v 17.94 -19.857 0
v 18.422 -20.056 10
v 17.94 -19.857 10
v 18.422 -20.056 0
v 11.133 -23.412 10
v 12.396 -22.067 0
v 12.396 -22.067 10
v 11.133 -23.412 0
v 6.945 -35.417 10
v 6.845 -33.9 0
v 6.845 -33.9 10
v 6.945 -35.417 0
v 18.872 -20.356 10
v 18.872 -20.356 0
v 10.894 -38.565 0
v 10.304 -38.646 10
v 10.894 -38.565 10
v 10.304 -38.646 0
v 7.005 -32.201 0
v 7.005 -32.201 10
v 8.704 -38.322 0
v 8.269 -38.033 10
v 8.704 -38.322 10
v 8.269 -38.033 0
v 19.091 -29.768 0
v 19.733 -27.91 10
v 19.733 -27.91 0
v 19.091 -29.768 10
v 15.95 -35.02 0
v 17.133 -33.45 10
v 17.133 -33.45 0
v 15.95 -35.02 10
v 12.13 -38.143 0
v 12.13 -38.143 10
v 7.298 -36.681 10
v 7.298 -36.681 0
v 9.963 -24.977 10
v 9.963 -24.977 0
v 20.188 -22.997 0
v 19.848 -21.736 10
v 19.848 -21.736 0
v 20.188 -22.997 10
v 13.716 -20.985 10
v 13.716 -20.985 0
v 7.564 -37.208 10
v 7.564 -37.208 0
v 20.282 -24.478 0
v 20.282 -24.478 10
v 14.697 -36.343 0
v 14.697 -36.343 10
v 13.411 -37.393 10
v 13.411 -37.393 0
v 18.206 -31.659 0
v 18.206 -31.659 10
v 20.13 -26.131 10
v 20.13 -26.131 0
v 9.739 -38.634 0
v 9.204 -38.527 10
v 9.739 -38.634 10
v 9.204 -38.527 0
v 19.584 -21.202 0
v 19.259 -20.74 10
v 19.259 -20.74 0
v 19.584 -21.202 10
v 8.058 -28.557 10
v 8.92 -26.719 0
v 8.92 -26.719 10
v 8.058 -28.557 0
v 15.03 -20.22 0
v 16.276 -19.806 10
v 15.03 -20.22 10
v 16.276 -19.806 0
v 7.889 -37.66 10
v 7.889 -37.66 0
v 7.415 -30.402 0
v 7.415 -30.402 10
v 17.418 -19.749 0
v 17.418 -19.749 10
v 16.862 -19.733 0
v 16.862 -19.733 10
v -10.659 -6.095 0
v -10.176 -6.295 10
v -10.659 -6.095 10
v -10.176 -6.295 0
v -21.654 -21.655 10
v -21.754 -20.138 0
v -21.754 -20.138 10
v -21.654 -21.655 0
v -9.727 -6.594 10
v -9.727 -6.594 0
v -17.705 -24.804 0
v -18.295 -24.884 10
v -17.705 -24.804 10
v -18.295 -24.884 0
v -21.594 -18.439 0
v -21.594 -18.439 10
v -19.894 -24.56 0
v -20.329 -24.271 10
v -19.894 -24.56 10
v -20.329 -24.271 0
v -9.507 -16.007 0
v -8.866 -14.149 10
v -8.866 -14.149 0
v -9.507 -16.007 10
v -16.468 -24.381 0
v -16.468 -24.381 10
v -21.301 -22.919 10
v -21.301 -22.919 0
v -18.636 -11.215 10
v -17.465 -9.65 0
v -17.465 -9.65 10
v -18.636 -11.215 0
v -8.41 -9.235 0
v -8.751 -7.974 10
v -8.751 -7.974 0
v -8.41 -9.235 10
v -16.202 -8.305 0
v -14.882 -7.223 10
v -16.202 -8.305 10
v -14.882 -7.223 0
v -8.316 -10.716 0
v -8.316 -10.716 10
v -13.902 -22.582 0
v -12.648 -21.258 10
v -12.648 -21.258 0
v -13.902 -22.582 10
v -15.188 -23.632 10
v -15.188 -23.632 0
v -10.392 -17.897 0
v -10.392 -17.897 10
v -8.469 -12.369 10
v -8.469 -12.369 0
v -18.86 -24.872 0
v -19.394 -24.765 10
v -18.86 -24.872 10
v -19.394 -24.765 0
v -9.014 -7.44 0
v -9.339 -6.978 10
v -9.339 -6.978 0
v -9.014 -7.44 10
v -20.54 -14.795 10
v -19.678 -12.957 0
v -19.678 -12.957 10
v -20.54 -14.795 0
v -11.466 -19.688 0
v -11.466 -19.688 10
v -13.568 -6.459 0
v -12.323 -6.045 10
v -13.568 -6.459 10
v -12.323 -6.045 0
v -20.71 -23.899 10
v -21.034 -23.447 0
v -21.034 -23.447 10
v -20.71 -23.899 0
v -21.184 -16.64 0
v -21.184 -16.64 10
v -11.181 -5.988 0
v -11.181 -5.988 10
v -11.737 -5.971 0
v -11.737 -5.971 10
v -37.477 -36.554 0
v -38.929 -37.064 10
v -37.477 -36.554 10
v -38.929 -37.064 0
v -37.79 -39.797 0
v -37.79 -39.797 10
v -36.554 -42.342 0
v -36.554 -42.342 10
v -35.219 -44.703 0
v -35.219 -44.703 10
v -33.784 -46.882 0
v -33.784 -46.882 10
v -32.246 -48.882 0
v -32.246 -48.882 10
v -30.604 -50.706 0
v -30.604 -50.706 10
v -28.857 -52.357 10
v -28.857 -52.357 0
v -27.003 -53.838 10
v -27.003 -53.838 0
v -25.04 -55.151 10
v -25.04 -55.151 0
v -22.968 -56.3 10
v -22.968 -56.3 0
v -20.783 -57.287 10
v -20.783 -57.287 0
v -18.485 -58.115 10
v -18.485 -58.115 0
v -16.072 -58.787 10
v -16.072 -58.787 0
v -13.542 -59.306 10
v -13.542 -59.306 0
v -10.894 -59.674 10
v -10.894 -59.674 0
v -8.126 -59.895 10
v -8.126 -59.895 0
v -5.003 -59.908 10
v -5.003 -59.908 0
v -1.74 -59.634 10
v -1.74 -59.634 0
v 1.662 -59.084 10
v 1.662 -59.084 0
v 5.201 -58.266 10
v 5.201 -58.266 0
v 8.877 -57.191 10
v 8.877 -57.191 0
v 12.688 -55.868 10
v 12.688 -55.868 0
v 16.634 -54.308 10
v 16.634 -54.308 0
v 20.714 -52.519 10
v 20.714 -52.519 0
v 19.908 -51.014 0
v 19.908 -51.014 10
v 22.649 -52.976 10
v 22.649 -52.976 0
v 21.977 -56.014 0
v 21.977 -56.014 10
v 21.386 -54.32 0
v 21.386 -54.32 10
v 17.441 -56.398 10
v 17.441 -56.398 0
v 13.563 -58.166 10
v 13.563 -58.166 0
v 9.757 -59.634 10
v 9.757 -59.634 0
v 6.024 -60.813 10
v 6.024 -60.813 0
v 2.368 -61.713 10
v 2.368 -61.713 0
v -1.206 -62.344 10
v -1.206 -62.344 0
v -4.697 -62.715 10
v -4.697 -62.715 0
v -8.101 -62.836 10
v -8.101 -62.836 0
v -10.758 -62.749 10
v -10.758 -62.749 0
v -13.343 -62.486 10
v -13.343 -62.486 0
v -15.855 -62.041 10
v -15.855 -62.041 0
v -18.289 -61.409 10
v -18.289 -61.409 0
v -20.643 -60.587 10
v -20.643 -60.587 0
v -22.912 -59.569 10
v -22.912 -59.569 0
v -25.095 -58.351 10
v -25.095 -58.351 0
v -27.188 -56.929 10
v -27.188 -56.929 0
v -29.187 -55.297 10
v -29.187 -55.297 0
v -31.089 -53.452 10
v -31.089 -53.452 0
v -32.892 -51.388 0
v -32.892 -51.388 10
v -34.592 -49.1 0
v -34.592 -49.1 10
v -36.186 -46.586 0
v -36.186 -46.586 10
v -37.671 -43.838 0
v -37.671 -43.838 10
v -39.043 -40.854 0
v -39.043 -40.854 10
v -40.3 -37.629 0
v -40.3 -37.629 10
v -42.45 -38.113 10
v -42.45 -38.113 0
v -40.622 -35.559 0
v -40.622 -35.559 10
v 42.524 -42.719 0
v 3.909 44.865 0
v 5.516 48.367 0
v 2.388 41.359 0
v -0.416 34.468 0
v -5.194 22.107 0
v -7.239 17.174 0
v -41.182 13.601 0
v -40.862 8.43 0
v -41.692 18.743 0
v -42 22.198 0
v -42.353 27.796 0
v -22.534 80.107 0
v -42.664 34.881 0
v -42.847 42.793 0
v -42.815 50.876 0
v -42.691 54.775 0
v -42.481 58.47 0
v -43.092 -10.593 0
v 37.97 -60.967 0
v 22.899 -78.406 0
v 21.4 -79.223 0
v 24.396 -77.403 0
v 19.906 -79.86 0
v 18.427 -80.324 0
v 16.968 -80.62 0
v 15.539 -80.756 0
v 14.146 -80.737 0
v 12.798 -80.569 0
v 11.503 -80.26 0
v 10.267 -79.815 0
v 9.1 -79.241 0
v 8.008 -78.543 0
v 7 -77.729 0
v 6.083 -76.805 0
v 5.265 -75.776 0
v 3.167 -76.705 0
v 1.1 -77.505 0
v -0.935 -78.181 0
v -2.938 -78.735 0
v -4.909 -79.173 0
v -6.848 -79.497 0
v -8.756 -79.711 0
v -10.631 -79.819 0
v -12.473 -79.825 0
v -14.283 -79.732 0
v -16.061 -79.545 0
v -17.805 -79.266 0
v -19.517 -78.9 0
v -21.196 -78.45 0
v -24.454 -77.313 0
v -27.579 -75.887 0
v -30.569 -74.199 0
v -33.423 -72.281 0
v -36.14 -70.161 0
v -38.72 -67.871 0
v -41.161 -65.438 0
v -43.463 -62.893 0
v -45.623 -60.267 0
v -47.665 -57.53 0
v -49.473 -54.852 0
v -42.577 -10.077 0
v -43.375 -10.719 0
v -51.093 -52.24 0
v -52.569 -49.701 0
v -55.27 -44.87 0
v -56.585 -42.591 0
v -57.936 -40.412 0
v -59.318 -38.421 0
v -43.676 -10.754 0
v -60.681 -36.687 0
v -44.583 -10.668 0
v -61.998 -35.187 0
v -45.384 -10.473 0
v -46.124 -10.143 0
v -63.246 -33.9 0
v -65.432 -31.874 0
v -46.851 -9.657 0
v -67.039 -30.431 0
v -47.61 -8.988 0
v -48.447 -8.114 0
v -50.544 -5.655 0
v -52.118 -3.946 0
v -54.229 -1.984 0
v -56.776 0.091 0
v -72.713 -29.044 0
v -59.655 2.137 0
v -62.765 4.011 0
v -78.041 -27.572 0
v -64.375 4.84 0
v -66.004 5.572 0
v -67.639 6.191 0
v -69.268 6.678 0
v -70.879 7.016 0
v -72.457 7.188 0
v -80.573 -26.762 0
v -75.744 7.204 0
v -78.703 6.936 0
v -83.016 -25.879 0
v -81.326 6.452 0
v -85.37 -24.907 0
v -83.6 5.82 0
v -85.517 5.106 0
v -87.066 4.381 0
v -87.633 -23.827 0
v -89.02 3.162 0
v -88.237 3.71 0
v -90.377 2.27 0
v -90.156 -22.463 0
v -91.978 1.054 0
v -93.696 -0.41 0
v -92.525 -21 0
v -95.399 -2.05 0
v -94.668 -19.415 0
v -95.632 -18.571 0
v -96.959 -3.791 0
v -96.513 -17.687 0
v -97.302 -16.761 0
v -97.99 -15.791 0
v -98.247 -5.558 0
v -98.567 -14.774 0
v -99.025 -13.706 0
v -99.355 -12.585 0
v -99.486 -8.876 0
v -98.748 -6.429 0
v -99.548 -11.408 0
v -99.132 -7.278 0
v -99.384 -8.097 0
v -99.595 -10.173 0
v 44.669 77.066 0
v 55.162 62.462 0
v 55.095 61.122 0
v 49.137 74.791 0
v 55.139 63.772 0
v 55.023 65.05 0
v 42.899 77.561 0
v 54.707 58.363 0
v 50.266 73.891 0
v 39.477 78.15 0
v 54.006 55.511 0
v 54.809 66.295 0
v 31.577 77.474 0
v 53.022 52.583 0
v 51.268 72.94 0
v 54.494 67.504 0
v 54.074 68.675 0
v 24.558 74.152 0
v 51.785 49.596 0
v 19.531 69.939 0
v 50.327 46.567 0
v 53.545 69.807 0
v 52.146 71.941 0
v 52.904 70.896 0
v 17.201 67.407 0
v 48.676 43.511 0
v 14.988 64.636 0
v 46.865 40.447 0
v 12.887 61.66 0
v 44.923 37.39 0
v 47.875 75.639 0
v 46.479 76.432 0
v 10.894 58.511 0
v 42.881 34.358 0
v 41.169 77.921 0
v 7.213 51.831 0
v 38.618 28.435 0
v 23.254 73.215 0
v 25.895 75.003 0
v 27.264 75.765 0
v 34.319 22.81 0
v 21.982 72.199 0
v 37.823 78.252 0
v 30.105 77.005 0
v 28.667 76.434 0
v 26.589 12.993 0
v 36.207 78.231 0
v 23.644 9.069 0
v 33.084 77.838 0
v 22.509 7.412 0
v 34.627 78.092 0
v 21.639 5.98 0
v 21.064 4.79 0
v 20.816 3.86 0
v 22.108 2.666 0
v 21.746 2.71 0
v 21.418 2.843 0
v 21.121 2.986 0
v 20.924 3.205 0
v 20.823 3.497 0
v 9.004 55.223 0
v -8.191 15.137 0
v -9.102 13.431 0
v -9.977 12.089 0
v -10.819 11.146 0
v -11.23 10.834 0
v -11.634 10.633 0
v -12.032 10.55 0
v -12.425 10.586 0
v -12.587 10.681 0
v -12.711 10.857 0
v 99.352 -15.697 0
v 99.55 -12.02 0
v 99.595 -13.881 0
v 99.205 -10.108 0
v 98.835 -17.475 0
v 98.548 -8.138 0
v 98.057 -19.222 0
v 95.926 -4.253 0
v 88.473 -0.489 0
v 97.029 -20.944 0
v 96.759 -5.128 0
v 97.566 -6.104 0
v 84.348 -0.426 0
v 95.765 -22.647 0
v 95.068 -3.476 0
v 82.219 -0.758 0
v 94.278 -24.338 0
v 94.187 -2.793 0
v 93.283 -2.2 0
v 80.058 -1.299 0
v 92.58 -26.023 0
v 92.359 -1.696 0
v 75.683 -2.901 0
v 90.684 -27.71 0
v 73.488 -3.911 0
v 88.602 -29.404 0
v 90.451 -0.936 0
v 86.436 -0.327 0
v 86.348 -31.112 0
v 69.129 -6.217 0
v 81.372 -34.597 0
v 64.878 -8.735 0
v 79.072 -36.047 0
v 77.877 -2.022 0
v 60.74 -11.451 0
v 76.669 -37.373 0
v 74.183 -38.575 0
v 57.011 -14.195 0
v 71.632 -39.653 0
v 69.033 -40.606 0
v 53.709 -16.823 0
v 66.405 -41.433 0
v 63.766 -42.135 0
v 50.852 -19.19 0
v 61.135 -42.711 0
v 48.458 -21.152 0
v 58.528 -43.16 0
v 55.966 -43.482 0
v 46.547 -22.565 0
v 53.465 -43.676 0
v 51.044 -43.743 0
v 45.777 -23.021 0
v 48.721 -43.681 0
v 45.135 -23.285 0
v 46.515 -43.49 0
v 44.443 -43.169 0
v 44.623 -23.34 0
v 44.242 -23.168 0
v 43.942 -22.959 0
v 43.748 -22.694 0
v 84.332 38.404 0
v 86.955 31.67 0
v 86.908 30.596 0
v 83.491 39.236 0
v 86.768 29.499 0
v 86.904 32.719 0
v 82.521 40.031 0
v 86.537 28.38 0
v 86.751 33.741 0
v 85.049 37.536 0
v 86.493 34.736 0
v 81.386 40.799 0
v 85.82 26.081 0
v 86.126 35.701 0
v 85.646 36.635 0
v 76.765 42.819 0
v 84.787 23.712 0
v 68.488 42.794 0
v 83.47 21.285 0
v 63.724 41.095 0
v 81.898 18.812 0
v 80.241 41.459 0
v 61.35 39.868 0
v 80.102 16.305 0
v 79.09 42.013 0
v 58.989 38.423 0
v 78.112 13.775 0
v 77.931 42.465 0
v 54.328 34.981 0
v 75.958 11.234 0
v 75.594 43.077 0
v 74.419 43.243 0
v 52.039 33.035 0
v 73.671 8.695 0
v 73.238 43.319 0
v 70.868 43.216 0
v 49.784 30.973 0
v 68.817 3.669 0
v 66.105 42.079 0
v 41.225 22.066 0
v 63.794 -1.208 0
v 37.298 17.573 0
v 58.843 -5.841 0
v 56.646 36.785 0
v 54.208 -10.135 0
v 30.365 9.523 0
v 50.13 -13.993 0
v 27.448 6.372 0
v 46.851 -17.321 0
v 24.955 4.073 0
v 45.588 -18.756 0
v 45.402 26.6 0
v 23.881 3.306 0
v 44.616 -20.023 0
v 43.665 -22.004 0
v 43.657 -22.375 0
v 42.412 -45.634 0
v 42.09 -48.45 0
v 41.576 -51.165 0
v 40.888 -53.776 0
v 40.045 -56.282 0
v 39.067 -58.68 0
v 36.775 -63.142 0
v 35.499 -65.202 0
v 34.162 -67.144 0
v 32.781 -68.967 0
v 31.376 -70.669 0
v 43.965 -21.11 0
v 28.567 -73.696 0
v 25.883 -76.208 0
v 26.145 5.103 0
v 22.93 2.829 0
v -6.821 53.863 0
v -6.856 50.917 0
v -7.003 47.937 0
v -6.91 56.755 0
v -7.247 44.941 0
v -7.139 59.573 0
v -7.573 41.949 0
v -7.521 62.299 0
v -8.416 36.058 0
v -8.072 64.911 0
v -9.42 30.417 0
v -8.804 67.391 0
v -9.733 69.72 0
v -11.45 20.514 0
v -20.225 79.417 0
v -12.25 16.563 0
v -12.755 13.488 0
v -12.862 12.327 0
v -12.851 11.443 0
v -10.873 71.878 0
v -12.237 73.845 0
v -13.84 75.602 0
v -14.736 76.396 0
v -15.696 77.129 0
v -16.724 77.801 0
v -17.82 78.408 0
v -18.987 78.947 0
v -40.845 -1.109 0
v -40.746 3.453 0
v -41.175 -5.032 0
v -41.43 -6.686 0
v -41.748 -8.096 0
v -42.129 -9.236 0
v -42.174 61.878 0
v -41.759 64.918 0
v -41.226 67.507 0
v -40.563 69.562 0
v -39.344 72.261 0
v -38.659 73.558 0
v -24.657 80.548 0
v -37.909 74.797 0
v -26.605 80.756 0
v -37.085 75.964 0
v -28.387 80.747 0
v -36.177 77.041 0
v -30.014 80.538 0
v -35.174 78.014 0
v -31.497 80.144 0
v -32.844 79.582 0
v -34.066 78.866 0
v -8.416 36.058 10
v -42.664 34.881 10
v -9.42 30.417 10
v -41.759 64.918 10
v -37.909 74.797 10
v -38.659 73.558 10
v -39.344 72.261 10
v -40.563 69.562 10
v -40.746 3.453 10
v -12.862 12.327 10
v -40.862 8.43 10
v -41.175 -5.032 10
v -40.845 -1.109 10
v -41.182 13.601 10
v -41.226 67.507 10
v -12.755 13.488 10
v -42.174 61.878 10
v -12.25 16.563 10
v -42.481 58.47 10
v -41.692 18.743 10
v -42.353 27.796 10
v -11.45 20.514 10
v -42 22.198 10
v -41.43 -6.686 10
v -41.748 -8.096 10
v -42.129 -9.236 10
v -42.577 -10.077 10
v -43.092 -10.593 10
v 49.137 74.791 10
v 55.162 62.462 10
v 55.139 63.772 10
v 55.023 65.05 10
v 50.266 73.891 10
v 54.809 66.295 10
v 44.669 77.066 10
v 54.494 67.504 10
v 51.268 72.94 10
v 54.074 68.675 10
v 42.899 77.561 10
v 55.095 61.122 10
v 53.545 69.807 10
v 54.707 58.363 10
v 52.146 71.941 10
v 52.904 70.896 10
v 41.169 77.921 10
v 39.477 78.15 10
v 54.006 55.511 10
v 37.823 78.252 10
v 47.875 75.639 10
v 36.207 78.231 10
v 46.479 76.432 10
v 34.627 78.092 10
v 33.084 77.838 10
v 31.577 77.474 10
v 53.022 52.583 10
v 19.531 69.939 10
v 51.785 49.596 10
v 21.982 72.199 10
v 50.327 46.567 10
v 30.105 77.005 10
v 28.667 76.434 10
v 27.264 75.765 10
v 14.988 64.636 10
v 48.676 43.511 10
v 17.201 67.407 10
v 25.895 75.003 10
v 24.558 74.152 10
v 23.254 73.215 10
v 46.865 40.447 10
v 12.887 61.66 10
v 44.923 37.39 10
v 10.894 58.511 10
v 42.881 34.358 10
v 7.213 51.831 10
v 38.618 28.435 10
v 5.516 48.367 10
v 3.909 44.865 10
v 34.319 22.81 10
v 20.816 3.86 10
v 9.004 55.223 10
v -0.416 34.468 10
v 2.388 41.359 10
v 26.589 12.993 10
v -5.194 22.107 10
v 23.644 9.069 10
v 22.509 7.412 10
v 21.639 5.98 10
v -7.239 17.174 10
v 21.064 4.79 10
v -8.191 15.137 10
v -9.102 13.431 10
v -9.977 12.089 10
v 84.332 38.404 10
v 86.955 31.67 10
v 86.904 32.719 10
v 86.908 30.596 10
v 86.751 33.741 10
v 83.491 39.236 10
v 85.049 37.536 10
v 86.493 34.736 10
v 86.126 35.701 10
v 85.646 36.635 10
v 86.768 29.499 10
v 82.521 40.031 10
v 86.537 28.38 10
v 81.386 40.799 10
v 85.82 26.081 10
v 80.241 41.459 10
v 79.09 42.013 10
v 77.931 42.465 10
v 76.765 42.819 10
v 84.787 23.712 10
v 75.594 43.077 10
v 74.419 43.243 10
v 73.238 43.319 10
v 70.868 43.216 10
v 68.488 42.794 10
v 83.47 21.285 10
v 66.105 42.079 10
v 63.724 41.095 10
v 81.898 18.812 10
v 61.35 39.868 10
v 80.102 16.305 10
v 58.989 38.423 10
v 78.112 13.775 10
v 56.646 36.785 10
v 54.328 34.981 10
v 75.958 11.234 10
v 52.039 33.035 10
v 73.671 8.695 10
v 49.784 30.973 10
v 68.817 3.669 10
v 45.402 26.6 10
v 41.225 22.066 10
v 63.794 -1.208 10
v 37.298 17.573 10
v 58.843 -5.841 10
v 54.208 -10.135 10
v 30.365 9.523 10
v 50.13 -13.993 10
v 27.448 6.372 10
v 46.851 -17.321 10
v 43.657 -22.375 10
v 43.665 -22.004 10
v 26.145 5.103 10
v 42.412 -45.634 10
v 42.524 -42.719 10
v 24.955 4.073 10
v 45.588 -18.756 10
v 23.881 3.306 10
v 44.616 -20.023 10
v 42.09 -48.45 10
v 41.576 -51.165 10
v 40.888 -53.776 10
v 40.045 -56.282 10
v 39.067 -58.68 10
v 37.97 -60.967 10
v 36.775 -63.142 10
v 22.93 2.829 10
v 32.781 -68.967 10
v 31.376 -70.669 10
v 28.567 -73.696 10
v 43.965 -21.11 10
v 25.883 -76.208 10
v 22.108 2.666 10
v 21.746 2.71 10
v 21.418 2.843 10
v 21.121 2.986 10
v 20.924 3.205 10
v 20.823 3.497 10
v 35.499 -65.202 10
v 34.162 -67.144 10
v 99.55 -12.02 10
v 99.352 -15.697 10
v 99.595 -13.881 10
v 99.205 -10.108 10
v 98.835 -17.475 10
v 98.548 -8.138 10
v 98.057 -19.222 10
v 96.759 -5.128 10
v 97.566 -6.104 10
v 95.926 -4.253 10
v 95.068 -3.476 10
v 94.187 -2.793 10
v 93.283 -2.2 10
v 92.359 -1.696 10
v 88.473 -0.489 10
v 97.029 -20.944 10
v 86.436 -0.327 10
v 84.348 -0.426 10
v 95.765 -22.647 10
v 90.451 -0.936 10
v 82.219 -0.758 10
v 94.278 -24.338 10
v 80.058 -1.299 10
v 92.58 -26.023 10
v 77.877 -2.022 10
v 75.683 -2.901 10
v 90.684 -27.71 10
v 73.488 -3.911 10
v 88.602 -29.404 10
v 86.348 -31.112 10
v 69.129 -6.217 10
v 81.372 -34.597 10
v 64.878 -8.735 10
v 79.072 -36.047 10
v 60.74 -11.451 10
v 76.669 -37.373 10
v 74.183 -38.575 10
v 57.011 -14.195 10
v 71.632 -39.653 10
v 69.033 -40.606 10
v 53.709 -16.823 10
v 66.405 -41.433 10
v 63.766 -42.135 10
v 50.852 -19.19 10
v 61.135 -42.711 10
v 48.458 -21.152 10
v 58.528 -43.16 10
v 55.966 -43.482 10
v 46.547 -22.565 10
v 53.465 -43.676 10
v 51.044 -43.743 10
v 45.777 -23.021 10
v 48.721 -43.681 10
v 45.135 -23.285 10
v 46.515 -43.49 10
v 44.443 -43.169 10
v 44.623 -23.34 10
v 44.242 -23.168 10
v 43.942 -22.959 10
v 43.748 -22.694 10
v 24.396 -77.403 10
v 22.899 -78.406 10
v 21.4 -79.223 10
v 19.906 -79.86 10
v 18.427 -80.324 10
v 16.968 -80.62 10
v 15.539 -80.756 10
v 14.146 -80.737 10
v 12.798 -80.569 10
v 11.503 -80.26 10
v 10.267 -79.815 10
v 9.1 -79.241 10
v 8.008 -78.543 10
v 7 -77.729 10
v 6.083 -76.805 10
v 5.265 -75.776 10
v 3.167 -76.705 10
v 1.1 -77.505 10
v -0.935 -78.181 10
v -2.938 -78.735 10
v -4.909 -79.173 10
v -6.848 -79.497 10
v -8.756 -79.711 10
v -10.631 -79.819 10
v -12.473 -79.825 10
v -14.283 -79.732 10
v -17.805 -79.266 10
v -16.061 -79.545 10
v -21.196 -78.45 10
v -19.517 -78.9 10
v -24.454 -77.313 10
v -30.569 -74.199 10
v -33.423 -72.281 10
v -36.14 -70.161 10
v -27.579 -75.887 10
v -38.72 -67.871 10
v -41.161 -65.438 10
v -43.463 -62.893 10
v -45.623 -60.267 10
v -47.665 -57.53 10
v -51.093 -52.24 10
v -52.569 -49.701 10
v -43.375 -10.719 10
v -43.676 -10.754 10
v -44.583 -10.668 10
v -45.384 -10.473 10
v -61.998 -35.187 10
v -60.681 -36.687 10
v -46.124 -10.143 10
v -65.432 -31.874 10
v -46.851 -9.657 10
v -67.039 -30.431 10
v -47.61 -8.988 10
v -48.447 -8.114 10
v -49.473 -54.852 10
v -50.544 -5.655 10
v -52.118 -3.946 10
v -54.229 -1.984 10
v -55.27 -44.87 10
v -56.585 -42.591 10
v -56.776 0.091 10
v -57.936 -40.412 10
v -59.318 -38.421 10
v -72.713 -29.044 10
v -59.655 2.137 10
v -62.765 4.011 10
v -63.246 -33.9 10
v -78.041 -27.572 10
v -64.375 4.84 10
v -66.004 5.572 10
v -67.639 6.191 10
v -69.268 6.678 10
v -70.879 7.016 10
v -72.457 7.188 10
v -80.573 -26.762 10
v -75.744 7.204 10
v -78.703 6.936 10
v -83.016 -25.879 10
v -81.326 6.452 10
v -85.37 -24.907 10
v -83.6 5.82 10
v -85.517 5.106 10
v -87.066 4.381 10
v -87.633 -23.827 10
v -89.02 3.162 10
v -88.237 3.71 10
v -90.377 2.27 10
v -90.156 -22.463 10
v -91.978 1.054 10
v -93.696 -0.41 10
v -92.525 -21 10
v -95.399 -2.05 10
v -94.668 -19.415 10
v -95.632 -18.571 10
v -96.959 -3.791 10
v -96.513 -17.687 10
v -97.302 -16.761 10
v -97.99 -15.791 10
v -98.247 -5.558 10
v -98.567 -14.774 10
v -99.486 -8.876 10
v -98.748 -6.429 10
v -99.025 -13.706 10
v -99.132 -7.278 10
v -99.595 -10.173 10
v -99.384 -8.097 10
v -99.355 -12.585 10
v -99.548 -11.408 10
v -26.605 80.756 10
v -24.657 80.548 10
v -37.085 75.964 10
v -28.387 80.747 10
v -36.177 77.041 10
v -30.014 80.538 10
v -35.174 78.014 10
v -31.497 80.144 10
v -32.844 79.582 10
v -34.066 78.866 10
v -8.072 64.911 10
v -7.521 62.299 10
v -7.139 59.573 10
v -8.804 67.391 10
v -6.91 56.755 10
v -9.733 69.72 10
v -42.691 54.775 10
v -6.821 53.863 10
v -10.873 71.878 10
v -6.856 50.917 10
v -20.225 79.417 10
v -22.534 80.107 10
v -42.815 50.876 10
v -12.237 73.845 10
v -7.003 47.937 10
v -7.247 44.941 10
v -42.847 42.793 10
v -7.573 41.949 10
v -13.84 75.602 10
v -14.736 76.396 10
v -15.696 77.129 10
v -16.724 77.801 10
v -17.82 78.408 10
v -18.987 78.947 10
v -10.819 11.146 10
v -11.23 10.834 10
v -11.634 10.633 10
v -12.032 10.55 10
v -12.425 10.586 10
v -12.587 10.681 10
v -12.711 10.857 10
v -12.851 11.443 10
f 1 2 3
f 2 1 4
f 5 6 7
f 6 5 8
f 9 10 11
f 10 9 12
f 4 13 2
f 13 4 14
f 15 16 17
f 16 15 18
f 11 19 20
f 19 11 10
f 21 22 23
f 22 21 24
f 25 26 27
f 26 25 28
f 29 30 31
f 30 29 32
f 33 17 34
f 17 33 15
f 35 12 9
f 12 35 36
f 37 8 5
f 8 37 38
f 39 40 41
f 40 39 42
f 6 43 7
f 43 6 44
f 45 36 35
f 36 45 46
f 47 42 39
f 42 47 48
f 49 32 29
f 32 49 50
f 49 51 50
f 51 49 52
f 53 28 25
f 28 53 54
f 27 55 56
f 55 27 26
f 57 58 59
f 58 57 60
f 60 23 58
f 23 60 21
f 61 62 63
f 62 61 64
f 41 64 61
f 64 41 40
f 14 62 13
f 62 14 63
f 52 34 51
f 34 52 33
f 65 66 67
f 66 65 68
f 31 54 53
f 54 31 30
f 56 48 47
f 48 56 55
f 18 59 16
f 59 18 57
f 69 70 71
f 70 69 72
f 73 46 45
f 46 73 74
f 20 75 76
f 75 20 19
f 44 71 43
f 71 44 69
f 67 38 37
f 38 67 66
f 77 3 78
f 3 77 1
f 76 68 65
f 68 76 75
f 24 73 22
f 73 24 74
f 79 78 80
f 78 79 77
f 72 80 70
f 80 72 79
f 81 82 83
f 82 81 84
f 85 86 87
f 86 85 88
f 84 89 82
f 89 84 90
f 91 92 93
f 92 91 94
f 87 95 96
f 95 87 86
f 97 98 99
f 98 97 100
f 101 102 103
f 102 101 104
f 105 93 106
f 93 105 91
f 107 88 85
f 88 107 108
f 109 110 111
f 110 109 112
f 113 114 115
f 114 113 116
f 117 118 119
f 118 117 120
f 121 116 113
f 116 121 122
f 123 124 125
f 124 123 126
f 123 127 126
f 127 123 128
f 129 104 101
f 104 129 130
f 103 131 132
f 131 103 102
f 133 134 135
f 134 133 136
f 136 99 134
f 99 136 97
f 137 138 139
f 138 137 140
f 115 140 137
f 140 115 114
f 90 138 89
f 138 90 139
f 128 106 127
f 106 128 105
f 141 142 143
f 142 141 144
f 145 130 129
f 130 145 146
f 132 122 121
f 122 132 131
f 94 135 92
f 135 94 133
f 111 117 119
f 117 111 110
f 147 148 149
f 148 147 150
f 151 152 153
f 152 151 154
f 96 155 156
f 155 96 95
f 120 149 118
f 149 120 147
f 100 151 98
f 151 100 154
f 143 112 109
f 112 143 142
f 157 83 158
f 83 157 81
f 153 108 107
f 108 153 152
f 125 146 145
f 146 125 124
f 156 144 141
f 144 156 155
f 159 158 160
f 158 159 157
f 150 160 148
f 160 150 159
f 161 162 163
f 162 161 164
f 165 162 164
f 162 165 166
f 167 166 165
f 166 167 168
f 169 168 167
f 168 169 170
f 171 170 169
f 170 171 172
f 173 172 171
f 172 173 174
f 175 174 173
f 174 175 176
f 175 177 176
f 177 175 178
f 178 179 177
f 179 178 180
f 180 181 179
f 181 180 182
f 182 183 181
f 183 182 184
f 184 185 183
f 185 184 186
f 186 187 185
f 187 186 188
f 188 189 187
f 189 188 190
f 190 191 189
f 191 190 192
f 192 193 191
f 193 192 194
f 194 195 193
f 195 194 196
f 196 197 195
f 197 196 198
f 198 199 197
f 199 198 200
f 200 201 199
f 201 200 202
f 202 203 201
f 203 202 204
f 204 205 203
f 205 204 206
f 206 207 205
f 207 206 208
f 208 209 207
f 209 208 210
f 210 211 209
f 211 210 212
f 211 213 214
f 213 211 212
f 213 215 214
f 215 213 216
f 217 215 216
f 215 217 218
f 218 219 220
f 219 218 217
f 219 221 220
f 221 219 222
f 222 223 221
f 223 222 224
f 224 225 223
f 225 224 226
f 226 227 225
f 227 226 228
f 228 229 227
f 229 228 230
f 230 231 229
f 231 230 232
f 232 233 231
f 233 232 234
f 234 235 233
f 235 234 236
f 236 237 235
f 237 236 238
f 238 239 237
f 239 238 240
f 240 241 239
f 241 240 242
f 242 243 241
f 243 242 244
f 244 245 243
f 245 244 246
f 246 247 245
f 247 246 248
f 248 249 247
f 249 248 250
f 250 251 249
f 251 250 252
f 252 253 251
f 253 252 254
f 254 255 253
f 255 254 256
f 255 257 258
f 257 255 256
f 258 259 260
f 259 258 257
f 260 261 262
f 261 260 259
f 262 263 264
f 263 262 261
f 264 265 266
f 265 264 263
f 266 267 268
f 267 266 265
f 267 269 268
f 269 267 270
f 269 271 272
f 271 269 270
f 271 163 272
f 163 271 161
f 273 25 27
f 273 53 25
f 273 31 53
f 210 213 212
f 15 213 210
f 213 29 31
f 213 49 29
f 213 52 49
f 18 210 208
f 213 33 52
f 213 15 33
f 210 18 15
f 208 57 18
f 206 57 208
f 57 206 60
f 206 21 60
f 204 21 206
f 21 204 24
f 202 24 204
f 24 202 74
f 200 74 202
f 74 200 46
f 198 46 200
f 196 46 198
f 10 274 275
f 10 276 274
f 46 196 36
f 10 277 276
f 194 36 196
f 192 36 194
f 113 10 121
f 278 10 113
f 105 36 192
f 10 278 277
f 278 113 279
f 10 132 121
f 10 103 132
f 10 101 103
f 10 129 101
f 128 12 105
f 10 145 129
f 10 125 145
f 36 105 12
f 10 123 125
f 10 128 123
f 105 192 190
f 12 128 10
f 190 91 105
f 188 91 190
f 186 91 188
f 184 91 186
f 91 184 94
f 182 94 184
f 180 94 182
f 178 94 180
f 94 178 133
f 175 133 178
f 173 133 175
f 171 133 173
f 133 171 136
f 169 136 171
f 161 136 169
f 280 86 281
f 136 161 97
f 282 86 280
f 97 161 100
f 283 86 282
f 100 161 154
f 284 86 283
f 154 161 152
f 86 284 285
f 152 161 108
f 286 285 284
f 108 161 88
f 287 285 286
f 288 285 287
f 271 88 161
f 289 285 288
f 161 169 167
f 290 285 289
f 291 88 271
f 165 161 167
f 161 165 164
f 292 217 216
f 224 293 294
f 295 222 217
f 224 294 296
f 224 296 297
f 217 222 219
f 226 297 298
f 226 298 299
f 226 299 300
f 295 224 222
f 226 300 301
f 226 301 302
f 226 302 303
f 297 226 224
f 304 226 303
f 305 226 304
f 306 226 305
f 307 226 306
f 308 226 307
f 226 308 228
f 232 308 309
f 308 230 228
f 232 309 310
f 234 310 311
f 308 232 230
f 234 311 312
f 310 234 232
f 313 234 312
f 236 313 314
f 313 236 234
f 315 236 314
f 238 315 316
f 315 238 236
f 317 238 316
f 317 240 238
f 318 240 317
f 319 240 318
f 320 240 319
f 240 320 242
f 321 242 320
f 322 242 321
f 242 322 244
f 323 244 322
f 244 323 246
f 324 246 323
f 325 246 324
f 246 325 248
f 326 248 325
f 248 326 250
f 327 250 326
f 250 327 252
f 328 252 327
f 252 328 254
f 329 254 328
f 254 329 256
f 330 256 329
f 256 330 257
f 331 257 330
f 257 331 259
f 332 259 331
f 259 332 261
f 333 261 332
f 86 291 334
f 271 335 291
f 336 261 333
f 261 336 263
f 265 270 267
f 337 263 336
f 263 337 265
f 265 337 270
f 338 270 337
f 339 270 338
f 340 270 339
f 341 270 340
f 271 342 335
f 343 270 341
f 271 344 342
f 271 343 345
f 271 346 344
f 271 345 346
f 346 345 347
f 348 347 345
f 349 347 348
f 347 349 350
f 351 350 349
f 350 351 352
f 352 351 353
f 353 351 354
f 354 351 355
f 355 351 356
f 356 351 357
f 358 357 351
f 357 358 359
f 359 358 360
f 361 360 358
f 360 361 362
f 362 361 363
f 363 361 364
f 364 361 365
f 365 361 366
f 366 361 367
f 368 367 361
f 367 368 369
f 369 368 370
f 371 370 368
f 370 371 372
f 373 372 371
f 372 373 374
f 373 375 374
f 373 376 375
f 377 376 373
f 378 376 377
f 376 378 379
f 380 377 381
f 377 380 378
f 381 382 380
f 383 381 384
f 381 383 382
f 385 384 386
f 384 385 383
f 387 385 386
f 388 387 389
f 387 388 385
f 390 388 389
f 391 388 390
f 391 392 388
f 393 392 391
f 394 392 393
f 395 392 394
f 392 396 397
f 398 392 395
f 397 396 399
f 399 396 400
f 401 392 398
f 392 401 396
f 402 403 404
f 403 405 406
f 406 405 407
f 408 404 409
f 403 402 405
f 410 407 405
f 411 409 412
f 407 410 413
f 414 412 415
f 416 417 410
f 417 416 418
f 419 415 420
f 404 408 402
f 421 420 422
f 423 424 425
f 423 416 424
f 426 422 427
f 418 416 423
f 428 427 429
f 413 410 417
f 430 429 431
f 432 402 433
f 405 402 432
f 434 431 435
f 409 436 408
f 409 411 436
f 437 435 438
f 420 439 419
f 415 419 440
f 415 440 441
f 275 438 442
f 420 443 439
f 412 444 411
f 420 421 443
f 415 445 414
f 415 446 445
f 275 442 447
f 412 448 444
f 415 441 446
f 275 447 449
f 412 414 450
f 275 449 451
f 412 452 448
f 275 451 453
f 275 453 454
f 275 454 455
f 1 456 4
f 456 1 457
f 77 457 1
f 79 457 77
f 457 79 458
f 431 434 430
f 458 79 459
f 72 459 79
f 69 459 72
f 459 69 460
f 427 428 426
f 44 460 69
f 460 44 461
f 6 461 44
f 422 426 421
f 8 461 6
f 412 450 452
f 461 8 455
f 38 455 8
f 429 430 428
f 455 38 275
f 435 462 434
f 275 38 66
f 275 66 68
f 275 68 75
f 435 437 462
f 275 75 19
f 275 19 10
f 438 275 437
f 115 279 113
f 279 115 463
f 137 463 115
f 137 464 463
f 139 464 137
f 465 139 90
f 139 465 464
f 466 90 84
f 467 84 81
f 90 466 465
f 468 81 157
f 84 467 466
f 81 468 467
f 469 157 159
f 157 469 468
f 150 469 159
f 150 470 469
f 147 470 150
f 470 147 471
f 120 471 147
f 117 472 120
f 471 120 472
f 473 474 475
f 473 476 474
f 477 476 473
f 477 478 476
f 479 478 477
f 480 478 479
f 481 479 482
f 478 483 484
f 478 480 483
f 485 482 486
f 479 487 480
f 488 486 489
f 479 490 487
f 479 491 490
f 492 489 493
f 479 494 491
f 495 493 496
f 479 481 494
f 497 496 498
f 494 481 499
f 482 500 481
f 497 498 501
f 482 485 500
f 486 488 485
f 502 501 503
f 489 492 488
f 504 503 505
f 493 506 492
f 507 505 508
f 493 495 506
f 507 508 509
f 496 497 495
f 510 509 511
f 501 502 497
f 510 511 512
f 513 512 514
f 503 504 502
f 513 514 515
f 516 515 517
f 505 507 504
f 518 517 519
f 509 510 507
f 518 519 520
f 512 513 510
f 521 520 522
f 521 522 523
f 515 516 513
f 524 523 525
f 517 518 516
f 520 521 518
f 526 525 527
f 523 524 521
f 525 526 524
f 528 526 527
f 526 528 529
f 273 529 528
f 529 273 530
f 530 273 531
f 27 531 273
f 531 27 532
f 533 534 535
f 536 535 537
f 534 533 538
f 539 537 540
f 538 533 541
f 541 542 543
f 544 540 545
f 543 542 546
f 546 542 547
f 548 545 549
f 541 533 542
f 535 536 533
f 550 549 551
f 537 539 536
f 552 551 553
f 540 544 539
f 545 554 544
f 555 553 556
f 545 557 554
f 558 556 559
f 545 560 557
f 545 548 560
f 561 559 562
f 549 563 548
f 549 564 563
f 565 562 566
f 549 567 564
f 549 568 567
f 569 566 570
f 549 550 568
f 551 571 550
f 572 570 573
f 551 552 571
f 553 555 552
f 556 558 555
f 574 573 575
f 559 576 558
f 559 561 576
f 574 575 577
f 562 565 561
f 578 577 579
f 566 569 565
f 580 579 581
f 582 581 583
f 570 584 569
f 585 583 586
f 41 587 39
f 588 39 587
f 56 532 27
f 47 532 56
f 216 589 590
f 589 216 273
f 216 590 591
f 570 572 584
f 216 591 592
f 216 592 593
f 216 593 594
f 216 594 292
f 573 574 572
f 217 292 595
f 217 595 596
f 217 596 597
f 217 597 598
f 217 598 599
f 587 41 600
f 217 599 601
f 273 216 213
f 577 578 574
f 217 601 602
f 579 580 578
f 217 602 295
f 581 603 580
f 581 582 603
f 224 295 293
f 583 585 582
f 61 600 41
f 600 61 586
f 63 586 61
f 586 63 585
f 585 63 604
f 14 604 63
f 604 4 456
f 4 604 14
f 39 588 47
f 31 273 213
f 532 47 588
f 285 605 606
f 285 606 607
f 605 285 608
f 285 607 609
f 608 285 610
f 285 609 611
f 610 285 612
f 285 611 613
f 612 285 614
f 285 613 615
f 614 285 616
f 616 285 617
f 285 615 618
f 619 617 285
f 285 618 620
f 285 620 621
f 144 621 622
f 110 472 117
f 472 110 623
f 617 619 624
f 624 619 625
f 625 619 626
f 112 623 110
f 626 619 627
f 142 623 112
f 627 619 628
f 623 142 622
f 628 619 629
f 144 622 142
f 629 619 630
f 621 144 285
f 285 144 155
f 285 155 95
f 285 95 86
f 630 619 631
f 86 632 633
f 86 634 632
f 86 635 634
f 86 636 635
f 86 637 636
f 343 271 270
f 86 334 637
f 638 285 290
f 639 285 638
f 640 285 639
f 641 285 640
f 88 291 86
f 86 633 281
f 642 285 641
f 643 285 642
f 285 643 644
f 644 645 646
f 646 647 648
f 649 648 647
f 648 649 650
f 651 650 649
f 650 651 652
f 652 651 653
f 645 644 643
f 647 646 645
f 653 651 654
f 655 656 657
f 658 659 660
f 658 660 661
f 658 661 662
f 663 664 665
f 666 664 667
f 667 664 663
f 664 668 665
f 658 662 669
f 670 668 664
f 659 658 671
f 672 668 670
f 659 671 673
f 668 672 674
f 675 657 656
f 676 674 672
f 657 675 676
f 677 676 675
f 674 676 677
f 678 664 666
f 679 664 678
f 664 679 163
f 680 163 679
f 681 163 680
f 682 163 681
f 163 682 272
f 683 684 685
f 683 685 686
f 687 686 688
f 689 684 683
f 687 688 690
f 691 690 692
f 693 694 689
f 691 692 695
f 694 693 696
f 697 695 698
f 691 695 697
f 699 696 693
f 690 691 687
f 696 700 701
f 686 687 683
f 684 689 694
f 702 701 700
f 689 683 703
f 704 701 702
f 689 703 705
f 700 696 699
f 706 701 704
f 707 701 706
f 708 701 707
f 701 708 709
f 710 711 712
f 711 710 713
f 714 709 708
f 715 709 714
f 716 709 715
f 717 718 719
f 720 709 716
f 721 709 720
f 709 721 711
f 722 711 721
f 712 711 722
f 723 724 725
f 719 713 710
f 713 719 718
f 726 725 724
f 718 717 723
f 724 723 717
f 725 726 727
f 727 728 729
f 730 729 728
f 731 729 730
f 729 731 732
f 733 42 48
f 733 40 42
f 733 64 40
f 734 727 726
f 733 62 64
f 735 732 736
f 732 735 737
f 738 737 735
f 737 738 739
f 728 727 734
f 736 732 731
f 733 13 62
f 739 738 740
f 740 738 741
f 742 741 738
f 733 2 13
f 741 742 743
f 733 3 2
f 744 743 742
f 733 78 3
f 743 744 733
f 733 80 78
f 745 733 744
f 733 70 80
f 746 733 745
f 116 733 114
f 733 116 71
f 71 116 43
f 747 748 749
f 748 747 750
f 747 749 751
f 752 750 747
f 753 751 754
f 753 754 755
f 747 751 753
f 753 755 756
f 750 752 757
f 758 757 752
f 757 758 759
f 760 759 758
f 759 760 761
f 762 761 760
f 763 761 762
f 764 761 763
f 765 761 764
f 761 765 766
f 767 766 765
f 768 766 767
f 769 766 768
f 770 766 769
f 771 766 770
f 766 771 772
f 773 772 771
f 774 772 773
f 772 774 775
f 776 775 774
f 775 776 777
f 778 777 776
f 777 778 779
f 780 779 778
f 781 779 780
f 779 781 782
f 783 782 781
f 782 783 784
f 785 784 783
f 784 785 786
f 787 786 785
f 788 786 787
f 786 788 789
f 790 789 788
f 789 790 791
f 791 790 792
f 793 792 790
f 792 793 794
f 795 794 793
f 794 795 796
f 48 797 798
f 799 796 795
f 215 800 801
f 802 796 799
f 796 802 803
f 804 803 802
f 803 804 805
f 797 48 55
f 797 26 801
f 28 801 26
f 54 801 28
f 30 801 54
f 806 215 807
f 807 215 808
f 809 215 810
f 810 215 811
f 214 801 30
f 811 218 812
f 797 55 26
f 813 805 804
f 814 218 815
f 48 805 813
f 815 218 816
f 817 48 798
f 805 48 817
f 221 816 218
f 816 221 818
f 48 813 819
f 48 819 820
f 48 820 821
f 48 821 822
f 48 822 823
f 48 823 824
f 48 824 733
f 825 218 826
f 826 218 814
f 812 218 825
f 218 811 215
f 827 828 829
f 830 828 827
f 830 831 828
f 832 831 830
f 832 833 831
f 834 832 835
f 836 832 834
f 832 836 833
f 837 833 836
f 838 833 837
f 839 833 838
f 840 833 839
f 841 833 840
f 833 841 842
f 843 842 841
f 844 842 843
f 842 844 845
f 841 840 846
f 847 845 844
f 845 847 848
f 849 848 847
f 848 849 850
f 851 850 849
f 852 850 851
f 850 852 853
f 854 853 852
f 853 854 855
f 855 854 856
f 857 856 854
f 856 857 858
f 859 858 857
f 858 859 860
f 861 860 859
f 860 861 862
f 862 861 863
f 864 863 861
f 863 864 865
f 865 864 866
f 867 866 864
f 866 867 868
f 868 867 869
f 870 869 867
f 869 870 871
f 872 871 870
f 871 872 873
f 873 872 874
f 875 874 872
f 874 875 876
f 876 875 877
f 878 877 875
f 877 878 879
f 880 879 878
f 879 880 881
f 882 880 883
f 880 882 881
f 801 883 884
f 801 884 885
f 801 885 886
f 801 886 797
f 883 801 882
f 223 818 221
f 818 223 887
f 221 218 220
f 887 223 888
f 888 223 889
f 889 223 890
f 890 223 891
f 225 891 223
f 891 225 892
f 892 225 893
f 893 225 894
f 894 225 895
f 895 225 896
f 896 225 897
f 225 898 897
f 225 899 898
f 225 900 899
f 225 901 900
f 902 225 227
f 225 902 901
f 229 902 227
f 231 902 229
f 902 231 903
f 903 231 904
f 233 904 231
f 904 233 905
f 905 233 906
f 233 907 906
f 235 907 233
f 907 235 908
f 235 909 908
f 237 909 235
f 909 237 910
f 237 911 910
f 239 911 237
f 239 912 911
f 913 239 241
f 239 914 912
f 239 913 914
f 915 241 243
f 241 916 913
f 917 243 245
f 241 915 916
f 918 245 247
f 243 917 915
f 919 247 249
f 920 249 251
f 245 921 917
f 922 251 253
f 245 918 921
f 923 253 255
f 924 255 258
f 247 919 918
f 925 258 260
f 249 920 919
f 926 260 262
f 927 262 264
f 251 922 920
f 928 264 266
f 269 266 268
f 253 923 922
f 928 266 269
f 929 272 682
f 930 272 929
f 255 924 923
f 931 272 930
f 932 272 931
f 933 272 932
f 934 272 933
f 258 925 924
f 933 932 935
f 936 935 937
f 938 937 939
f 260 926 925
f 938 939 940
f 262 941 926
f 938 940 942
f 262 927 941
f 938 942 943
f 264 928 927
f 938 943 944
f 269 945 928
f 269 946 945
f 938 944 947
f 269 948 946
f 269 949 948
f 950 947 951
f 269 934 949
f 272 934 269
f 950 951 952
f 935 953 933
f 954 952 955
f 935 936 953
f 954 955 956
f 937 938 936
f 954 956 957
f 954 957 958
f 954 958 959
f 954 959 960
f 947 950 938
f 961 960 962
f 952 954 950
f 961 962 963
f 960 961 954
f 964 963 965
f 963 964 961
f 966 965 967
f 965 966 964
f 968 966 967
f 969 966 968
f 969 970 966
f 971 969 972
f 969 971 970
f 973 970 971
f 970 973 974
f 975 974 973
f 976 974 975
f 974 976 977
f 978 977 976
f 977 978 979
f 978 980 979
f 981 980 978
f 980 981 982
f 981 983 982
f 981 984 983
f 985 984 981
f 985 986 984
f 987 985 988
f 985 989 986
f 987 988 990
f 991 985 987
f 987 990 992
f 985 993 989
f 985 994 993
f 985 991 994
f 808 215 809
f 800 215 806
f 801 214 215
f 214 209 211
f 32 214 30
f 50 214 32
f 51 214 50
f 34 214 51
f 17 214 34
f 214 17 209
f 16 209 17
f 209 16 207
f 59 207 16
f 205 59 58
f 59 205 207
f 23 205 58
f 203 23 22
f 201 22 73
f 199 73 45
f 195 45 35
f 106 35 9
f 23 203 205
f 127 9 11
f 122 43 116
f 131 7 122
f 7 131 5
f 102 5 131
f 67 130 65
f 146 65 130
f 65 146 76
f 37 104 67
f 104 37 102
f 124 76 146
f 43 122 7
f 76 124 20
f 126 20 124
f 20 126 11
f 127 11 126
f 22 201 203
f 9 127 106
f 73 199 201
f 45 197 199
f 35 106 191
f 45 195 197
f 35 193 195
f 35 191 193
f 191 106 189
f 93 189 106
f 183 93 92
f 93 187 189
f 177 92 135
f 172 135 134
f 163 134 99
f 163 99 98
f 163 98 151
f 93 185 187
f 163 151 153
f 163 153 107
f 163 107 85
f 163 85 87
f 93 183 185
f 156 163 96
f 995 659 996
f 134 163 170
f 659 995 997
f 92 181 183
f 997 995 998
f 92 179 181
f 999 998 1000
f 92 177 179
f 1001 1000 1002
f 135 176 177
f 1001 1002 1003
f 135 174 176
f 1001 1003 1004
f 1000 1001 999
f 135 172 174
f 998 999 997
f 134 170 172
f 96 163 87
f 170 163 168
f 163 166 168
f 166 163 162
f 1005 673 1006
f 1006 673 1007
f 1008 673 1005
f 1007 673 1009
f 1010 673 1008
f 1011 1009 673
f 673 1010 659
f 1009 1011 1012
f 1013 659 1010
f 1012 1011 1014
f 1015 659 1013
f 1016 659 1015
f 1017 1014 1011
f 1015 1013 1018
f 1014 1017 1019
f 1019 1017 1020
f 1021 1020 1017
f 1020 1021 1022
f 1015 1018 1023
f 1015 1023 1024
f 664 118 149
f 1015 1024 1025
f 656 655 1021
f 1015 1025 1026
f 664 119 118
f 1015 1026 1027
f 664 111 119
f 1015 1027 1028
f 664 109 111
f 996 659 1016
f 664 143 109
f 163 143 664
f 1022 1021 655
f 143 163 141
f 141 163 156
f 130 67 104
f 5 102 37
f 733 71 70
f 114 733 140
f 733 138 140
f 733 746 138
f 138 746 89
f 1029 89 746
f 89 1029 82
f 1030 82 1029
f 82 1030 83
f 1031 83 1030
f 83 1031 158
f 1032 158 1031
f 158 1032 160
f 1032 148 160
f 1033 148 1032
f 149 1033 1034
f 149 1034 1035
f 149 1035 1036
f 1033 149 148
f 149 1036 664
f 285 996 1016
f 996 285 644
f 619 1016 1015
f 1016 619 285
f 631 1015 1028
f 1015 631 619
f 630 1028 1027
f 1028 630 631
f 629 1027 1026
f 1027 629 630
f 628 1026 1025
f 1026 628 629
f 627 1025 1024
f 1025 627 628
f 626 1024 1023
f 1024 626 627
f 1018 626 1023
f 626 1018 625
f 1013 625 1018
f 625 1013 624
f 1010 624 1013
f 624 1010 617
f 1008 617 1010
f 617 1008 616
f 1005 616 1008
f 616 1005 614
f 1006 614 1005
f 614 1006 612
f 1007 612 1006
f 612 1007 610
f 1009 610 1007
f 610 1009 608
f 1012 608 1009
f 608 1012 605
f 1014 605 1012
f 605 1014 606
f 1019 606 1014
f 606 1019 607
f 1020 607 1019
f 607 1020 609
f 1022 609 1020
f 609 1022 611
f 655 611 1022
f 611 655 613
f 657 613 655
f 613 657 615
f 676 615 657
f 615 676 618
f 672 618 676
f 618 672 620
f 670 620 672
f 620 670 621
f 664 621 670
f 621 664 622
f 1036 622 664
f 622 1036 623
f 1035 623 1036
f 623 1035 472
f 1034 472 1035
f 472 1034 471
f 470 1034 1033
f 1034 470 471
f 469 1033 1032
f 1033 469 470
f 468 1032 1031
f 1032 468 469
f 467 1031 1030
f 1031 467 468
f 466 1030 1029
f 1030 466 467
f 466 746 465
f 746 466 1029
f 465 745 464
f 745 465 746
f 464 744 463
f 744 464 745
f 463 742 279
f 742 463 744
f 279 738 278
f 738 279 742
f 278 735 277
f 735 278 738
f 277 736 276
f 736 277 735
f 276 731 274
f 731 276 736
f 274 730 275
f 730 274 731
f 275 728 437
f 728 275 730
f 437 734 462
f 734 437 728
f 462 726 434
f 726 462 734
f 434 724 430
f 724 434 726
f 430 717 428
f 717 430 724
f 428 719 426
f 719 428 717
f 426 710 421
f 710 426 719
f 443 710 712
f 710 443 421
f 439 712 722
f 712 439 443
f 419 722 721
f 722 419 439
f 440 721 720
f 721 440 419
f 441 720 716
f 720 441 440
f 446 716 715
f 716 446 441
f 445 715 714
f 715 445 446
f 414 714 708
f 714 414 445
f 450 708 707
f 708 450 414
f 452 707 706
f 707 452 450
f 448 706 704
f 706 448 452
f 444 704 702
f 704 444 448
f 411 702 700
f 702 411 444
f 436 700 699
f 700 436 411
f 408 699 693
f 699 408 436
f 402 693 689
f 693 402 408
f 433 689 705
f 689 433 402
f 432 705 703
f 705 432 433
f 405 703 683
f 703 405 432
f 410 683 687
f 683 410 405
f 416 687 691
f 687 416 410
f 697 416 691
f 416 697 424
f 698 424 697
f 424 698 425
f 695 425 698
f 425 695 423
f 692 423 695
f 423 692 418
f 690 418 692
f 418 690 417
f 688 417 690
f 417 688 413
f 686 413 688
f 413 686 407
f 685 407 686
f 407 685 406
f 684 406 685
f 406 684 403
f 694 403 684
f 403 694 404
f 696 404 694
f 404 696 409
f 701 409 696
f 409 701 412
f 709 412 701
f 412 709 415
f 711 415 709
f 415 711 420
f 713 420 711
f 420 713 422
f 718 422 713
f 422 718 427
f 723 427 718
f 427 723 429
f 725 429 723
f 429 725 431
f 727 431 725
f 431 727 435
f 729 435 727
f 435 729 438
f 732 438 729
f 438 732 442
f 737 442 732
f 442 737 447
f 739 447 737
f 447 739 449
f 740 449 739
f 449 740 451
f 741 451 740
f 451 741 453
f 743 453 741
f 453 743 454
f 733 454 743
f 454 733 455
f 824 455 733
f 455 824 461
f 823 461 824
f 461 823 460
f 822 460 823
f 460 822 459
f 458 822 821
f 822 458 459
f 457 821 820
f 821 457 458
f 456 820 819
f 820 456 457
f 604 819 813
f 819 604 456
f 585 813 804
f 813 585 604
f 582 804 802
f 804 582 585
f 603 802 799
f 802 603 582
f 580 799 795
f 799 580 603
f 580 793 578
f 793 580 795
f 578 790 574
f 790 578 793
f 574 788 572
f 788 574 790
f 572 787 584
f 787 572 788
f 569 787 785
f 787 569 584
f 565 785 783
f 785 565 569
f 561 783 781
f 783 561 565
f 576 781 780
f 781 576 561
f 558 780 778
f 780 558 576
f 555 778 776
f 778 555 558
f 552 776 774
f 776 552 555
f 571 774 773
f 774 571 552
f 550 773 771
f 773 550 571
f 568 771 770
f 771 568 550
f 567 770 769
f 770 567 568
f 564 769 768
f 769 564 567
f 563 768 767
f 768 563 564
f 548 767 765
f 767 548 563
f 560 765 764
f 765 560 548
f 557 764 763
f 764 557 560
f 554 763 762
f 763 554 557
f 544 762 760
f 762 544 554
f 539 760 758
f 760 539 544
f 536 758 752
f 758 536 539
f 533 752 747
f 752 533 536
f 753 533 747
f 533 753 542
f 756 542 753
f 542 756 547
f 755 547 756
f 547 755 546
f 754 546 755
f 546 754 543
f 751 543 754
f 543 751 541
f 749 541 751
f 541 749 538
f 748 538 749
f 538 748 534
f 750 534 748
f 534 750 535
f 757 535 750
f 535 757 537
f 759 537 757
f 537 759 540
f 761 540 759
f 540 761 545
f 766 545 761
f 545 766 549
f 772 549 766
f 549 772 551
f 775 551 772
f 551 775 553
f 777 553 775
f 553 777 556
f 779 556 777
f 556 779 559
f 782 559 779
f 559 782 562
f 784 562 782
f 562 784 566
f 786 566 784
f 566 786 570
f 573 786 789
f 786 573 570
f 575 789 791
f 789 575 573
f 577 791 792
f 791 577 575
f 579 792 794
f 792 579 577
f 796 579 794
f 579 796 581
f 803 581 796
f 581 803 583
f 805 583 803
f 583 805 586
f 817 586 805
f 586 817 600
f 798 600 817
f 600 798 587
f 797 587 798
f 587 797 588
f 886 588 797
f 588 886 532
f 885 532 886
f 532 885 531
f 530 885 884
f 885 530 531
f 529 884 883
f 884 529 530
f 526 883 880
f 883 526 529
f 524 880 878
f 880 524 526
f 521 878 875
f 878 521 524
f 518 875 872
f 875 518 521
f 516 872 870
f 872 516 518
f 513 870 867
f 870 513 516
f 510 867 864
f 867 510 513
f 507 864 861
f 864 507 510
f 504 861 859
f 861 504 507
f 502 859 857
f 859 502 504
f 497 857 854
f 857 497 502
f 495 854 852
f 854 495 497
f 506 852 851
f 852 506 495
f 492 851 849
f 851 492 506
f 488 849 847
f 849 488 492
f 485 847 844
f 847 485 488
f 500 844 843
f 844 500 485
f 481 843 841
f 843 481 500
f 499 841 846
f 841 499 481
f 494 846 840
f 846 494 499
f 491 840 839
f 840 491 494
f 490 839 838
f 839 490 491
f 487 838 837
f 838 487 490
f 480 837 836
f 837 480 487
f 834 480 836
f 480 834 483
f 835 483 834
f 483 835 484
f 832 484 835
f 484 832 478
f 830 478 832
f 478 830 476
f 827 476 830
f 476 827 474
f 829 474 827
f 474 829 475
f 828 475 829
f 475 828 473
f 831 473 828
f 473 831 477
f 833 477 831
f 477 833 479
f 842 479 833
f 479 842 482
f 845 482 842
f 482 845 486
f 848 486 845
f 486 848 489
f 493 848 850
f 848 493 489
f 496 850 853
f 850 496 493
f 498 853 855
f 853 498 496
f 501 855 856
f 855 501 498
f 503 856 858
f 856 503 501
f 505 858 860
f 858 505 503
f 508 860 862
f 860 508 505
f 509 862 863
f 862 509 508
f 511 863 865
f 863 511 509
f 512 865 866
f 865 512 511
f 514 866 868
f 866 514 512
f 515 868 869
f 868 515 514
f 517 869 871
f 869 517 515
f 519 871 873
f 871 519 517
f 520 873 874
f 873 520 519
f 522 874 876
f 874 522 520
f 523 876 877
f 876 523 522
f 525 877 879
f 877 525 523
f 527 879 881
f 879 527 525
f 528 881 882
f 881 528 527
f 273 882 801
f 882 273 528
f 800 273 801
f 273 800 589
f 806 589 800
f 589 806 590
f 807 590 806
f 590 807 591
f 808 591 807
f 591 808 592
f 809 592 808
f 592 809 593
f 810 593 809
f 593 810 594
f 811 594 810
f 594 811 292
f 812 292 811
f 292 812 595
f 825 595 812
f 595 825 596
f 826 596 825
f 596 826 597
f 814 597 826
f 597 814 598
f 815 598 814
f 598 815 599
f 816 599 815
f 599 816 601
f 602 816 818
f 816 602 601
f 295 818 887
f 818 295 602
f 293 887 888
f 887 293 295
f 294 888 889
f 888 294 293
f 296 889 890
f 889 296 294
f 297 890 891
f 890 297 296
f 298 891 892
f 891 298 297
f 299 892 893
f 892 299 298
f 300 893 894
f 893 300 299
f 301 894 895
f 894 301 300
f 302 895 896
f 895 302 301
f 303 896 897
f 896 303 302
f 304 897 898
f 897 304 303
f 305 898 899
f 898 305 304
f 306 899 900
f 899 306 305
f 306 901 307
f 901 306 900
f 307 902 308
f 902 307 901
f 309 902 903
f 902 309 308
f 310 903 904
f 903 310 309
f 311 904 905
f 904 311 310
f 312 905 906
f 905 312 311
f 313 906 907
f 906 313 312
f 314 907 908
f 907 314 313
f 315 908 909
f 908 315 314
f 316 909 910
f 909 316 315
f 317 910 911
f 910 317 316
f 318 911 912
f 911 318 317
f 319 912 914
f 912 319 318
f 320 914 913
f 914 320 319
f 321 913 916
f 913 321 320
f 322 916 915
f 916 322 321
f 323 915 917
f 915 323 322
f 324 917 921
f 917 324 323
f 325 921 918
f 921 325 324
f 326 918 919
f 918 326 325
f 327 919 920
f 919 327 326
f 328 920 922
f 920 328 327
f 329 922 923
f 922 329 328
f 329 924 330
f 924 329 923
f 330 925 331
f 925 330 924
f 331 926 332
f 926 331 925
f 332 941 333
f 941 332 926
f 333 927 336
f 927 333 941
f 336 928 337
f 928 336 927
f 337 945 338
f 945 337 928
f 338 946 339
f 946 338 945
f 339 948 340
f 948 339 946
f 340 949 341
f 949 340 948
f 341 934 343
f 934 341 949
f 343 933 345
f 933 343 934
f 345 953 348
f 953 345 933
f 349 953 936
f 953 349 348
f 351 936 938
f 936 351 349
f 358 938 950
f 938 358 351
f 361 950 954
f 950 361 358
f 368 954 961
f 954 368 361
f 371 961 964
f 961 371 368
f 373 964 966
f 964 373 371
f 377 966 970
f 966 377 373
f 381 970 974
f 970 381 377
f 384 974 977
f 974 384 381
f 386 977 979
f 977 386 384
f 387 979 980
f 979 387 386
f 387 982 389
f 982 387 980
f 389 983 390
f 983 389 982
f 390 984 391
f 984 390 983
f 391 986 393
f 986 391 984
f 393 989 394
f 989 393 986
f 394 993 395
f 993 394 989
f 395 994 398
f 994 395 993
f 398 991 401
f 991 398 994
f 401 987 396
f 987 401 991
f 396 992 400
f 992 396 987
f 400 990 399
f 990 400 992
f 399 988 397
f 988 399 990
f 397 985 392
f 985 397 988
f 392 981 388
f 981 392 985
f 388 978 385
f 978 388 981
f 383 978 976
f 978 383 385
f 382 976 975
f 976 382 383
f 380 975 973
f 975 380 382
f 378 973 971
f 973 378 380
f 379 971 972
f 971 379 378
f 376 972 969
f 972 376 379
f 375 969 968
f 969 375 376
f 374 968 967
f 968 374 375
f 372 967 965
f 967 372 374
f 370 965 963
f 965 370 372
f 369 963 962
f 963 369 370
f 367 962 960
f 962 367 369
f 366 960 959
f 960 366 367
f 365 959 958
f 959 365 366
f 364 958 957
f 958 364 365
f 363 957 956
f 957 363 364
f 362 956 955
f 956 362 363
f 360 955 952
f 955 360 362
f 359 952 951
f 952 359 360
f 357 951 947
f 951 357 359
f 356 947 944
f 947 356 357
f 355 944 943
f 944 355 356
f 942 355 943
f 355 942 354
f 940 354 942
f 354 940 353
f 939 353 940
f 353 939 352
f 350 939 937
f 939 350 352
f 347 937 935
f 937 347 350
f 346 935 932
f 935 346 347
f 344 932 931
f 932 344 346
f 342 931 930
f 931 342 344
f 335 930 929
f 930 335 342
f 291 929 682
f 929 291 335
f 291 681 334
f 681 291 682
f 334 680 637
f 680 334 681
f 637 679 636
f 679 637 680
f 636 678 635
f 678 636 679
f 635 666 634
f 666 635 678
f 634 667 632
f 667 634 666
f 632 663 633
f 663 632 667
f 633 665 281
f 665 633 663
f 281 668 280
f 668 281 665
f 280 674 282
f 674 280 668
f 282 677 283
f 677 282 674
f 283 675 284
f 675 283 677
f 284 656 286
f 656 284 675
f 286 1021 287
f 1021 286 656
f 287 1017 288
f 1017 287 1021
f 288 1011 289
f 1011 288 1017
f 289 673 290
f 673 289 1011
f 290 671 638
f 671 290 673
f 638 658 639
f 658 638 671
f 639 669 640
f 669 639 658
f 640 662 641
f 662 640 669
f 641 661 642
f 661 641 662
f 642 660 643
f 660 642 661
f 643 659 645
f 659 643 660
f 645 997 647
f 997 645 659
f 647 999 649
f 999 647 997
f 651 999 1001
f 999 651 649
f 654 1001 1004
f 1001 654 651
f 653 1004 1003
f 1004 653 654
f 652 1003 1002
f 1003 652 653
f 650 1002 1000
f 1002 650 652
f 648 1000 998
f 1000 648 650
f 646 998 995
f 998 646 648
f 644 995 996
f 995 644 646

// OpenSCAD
/*
# License

## Attribution-ShareAlike 4.0 International

*  License: CC BY-SA 4.0
*  Human Readable License: https://creativecommons.org/licenses/by-sa/4.0/
*  Complete Legal Terms: https://creativecommons.org/licenses/by-sa/4.0/legalcode

# Authors
*  Štěpán Škorpil (stopka@skorpils.cz)

*/

include <logo.lines.scad>;

module logo(h=10){
  difference(){
    e=0.01;
    poly_outline(h);
    translate([0,0,-e/2])
    union(){
      poly_rightEye(h+e);
      poly_leftEye(h+e);
      poly_mouth(h+e);
    }
  }
}

logo();
